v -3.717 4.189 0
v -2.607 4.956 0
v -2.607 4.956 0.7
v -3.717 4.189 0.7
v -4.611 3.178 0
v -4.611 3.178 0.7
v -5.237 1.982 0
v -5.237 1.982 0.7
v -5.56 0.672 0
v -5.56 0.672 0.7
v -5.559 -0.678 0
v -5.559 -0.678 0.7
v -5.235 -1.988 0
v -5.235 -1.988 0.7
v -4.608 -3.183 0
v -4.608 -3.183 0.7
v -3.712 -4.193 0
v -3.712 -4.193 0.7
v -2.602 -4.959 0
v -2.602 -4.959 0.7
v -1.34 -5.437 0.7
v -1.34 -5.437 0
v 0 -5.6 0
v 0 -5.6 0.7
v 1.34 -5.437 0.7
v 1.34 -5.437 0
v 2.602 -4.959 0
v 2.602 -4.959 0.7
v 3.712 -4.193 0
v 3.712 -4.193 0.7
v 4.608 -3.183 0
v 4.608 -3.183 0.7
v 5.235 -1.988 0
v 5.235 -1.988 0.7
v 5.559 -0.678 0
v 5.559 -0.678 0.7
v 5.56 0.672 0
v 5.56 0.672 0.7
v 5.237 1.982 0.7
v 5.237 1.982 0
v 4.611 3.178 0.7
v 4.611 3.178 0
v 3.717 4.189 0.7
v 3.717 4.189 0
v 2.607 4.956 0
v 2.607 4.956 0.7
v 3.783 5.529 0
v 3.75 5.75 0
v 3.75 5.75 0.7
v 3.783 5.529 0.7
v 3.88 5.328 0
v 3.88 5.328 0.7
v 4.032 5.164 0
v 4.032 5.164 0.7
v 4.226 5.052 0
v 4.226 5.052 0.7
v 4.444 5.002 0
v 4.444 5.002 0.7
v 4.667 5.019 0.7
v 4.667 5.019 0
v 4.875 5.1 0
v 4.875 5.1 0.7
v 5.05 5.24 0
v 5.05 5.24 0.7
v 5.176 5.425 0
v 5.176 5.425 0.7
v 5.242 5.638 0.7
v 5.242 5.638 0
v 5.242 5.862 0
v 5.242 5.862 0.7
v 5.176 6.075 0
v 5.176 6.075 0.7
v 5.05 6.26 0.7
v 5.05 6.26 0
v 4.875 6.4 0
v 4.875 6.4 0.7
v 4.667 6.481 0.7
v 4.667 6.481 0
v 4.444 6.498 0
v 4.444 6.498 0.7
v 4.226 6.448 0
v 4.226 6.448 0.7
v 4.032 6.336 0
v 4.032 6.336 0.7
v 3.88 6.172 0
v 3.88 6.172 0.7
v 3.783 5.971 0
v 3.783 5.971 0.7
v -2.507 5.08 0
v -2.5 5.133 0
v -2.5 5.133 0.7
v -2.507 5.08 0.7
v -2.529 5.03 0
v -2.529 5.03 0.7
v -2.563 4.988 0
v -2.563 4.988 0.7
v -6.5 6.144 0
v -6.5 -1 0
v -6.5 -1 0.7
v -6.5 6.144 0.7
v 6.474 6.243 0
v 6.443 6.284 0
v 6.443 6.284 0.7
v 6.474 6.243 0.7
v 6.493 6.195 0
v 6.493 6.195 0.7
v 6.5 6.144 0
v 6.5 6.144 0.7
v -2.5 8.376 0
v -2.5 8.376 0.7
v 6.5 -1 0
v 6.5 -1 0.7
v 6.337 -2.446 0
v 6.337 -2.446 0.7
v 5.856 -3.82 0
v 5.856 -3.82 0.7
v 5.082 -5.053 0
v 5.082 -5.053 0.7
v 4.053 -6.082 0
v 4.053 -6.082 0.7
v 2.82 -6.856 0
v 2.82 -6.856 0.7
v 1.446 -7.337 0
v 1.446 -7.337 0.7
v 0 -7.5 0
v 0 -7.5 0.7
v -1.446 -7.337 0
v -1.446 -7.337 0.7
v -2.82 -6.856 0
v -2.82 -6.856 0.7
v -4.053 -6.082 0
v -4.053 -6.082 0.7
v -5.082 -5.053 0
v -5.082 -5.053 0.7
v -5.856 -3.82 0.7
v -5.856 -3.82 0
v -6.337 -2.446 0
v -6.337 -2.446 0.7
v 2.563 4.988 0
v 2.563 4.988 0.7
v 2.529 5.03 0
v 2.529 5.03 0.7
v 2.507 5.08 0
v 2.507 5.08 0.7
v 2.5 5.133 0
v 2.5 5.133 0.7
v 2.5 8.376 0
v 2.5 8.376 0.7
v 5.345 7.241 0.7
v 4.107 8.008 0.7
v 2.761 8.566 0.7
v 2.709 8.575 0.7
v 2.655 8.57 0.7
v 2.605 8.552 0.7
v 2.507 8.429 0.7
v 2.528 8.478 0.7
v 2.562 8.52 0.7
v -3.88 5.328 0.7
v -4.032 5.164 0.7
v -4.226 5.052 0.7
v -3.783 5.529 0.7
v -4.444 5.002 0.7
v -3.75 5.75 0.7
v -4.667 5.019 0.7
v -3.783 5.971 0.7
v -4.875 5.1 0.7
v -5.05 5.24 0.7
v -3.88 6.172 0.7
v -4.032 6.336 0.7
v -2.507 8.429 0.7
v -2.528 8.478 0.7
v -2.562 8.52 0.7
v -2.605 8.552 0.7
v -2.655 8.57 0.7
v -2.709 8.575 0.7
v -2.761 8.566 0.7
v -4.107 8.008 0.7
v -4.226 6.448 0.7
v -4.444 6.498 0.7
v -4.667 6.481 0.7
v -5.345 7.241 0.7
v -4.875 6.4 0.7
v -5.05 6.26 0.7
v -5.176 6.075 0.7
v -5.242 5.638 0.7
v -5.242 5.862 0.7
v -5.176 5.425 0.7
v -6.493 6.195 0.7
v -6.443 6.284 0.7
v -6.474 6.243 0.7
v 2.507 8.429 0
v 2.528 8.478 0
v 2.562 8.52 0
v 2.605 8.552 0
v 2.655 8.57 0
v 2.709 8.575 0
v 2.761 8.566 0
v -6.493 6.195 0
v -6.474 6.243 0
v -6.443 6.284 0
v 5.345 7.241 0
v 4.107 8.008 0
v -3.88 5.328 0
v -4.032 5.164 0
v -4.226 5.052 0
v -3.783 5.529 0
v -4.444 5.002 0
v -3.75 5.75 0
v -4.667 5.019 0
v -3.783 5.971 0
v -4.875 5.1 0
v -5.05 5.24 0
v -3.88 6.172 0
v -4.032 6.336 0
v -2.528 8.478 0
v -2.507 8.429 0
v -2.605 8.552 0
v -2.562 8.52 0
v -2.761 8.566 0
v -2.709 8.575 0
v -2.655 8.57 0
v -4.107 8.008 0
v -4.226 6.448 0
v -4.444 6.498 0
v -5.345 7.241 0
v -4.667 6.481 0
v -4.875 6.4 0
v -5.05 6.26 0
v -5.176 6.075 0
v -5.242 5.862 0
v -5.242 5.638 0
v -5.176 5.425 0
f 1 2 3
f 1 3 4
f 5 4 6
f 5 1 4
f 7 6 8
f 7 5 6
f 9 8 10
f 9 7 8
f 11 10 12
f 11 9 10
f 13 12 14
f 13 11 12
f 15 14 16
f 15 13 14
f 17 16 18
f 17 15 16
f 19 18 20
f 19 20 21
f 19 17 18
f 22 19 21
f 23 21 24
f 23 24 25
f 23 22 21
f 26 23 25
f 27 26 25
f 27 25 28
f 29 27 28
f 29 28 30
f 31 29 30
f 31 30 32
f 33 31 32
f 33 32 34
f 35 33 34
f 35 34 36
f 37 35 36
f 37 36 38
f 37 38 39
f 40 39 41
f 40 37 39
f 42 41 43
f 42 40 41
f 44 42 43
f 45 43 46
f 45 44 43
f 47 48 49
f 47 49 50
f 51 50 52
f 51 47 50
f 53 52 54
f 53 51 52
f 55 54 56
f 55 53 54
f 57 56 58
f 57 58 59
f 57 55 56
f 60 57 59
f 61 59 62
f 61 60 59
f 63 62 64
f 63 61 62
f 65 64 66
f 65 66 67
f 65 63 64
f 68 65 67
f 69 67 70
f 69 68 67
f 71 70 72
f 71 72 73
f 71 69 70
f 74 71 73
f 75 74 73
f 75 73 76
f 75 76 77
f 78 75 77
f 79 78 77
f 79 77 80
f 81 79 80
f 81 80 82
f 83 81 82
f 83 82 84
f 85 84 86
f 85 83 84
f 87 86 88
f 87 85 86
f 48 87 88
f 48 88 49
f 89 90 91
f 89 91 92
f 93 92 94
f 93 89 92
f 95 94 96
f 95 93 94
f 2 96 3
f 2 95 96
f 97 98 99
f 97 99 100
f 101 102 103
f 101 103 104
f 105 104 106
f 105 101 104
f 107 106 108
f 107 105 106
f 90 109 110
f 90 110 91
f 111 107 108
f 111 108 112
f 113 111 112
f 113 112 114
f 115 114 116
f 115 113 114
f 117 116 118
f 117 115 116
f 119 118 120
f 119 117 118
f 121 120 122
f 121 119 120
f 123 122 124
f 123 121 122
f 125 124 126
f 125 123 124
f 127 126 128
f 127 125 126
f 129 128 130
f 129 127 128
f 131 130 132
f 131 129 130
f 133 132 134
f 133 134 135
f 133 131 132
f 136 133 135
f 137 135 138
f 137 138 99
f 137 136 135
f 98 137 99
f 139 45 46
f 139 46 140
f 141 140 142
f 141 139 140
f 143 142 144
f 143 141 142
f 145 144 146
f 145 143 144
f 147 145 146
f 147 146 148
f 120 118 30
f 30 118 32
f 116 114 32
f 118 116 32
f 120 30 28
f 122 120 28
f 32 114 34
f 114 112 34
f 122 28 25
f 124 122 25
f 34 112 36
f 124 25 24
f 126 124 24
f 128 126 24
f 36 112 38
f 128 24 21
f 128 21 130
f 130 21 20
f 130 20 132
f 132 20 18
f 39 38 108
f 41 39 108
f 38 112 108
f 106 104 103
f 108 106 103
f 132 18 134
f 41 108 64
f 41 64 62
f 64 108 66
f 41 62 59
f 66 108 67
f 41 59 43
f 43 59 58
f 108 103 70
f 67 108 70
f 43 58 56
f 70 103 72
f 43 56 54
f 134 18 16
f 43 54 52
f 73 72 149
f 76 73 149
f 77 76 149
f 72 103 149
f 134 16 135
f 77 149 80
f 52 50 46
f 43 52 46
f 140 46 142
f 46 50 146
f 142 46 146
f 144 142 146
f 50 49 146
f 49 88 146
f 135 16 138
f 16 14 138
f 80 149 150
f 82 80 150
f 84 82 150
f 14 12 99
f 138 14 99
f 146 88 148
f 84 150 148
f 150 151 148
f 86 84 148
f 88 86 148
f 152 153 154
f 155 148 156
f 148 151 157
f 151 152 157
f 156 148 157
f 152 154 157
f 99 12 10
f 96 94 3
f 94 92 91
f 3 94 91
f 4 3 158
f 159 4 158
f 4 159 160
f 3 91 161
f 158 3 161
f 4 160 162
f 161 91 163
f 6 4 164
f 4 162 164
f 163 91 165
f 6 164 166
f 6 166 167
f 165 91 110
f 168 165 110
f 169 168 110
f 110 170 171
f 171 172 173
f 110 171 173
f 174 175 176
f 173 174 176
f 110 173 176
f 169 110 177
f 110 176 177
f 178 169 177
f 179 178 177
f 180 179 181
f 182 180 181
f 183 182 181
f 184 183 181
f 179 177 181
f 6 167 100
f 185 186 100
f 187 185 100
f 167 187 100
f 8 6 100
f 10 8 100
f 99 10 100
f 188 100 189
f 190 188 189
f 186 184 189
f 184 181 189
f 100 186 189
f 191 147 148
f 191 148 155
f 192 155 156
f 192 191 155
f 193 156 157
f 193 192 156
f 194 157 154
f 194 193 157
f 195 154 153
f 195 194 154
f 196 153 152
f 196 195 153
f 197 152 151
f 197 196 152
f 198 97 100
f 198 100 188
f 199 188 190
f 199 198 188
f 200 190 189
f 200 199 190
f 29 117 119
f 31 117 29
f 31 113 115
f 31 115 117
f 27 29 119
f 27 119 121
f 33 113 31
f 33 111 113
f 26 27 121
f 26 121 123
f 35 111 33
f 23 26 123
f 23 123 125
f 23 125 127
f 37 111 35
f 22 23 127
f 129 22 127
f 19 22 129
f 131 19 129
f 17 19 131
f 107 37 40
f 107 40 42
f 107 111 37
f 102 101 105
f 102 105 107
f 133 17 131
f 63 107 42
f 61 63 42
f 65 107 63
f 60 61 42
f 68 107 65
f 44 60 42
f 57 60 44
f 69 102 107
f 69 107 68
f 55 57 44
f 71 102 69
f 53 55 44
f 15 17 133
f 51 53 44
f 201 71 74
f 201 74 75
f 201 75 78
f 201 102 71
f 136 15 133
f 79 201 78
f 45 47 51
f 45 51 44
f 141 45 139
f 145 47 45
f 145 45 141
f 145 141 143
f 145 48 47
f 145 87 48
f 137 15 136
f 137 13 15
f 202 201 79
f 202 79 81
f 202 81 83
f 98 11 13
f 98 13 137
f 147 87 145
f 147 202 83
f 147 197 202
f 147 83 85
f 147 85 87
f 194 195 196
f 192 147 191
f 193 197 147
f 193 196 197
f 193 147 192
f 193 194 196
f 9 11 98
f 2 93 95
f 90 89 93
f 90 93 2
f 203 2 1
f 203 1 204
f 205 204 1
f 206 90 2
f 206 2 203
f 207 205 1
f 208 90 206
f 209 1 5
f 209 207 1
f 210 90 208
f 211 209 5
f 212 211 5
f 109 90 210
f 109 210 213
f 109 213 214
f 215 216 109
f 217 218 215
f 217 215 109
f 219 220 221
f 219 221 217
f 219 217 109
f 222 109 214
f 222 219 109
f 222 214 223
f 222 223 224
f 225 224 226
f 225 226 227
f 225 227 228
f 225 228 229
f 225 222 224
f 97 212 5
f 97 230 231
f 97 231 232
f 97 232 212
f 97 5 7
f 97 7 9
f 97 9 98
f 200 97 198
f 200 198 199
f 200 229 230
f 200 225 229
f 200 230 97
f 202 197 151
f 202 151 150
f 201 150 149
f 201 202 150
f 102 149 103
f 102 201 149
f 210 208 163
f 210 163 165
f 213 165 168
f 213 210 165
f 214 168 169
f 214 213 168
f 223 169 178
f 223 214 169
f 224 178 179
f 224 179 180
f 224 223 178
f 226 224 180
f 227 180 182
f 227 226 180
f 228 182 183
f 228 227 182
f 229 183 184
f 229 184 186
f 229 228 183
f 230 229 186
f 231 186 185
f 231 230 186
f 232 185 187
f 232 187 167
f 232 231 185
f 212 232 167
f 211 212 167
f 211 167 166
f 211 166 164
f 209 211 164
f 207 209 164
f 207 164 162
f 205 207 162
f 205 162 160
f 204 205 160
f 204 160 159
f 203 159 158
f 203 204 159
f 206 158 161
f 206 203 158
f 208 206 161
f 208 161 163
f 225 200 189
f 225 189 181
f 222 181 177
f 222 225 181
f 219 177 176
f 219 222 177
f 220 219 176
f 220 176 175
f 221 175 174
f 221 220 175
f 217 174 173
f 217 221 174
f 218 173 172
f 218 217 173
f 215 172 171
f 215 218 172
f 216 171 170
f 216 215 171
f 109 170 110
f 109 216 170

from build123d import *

# Parameters (mm, degrees)
ESQUISSE1_R      = 0.75
EXTRUSION1_DEPTH = 0.7


with BuildPart() as part:
    # Esquisse1 → Extrusion1 (new body)
    with BuildSketch(Plane.XY):
        with BuildLine():
            Line((-6.5, -1), (-6.5, 6.144102864))
            ThreePointArc((-6.5, 6.144102864), (-6.485251672, 6.2194807), (-6.443181818, 6.283741565))
            ThreePointArc((-6.443181818, 6.283741565), (-4.741623269, 7.649641088), (-2.761363636, 8.565913312))
            ThreePointArc((-2.761363636, 8.565913312), (-2.582256056, 8.53722713), (-2.5, 8.375559683))
            Line((-2.5, 8.375559683), (-2.5, 5.133225107))
            ThreePointArc((-2.5, 5.133225107), (-2.528797357, 5.029834318), (-2.606896552, 4.956217345))
            ThreePointArc((-2.606896552, 4.956217345), (0, -5.6), (2.606896552, 4.956217345))
            ThreePointArc((2.606896552, 4.956217345), (2.528797357, 5.029834318), (2.5, 5.133225107))
            Line((2.5, 5.133225107), (2.5, 8.375559683))
            ThreePointArc((2.5, 8.375559683), (2.582256056, 8.53722713), (2.761363636, 8.565913312))
            ThreePointArc((2.761363636, 8.565913312), (4.741623269, 7.649641088), (6.443181818, 6.283741565))
            ThreePointArc((6.443181818, 6.283741565), (6.485251672, 6.2194807), (6.5, 6.144102864))
            Line((6.5, 6.144102864), (6.5, -1))
            ThreePointArc((6.5, -1), (0, -7.5), (-6.5, -1))
        make_face()
        with Locations((-4.5, 5.75)):
            Circle(ESQUISSE1_R, mode=Mode.SUBTRACT)
        with Locations((4.5, 5.75)):
            Circle(ESQUISSE1_R, mode=Mode.SUBTRACT)
    extrude(amount=EXTRUSION1_DEPTH)


solid = part.part
